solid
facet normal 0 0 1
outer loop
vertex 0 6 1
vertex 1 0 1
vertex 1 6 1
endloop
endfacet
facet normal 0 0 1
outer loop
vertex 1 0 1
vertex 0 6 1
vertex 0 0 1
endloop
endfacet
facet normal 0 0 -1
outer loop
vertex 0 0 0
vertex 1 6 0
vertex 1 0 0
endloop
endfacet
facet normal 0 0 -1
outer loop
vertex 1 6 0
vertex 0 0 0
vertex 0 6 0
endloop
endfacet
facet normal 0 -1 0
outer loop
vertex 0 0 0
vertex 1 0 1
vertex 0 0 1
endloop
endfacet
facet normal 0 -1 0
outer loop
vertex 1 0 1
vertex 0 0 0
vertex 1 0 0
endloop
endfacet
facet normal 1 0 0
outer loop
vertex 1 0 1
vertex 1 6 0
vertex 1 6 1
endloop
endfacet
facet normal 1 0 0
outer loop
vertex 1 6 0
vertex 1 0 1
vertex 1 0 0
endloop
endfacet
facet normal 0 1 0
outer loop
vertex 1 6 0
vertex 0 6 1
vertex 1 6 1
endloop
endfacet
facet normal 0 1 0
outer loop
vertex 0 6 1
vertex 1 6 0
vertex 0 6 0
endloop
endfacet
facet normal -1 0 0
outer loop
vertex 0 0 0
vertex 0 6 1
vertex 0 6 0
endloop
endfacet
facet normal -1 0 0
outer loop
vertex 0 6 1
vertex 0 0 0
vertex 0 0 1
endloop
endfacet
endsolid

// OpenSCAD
module upperArm(l,w,h){
  upperArmLength = l;
  upperArmWidth  = w;
  upperArmHeight = h;
  cube([upperArmWidth,upperArmLength,upperArmHeight]);
}
upperArm(6,1,1);
